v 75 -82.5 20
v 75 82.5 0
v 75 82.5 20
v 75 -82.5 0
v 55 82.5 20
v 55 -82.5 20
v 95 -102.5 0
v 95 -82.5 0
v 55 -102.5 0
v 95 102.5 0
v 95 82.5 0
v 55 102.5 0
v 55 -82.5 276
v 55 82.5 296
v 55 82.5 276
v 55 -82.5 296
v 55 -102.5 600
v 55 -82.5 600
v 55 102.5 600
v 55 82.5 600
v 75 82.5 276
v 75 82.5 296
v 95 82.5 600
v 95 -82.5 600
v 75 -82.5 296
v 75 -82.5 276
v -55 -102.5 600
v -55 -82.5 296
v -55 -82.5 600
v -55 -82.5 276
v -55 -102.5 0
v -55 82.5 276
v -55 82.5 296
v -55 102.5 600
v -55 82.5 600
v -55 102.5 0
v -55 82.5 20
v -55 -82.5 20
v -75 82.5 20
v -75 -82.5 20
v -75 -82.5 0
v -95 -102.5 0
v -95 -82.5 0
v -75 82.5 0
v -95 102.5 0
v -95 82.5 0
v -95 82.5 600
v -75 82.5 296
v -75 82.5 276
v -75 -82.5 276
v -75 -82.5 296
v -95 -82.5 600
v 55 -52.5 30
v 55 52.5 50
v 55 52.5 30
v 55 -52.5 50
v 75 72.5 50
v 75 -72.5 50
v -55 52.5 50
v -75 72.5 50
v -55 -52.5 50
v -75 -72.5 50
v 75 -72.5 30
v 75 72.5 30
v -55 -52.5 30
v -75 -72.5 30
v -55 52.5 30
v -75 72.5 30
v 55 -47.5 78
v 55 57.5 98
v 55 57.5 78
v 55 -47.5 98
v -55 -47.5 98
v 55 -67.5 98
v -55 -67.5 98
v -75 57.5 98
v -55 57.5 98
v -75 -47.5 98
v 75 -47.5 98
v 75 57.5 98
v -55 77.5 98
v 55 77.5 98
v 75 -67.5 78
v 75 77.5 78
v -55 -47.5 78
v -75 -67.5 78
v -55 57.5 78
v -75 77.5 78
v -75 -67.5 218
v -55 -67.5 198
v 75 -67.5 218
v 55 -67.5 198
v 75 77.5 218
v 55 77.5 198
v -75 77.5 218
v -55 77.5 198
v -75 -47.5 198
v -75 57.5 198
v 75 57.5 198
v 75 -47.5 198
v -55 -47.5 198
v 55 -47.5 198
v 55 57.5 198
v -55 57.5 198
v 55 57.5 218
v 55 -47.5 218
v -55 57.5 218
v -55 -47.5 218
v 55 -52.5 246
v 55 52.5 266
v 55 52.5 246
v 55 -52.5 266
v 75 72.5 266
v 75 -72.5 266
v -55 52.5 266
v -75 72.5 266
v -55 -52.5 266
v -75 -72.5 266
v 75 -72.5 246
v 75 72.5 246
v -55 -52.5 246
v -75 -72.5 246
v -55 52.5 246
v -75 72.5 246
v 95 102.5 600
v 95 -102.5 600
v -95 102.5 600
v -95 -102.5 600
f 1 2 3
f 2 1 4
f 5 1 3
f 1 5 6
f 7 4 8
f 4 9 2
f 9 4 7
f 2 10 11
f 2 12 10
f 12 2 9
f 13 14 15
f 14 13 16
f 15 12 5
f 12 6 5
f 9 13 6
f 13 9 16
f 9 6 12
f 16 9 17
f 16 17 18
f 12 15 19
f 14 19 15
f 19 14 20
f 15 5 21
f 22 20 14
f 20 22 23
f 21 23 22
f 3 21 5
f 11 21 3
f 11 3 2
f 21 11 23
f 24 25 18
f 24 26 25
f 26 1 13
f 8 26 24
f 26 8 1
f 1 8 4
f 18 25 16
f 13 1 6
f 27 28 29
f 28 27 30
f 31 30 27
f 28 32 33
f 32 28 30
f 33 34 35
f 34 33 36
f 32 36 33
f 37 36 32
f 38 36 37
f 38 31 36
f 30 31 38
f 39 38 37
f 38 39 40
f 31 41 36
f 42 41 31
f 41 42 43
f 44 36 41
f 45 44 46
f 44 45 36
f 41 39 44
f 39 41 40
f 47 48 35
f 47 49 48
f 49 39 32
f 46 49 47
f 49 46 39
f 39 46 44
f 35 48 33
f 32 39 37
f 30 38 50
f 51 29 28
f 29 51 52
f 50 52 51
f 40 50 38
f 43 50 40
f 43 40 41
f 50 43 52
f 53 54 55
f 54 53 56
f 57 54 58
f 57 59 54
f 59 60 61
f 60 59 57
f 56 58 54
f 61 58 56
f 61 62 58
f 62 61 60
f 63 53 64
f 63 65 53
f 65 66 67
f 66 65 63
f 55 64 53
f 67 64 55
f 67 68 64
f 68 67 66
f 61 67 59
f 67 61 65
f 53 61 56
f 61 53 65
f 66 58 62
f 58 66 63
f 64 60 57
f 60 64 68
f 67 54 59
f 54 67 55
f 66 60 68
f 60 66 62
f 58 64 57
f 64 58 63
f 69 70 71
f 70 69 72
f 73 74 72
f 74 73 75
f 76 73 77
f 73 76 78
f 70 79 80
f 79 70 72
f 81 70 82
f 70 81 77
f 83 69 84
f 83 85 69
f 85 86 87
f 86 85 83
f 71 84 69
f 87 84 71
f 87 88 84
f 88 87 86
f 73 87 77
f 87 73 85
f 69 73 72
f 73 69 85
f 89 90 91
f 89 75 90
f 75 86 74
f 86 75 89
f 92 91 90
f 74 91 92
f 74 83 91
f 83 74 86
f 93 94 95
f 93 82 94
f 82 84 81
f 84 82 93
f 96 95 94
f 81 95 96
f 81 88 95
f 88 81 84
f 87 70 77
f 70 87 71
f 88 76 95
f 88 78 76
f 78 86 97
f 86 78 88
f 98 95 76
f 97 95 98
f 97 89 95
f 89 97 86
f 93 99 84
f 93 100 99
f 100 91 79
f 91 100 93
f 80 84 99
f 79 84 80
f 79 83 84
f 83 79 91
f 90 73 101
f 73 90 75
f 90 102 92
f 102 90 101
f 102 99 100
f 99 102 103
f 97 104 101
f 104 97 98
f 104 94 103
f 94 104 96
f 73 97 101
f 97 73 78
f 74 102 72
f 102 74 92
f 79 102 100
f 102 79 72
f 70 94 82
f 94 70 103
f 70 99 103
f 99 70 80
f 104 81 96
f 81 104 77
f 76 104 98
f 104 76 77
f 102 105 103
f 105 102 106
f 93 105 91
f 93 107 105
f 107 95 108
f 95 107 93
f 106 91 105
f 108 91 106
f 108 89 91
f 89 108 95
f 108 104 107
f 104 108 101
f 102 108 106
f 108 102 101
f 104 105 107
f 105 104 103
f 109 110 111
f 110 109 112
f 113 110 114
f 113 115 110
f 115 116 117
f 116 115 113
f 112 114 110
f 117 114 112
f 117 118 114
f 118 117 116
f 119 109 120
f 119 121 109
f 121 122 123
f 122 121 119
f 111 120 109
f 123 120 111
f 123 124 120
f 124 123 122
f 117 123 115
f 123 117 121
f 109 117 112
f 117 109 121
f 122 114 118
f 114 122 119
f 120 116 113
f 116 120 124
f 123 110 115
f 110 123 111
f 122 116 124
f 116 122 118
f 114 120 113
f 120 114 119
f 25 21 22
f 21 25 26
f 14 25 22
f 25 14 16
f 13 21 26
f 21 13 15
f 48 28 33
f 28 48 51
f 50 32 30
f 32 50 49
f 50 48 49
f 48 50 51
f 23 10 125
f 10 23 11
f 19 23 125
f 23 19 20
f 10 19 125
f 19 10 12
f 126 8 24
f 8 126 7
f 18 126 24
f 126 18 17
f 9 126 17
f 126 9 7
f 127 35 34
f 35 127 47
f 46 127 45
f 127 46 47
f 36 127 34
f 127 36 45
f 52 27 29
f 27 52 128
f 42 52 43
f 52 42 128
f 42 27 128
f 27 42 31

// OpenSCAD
extrusion_length_for_plate_holder_box = 145;
extrusion_width_for_plate_holder_box = 110;
extrusion_height_for_plate_holder_box = 50;
orbit_radius=5;
theta=30;
spinner_gap=28;
dampener_gap=10;
spun_platebox_height=100;
spacing=10;
space_for_apparatus=0;

total_height=600;

module flatbox(length,width,include_cross=true){
    translate([-(width+40)/2,-length/2]){
cube([20,length,20]);
translate([20+width,0])cube([20,length,20]);
        if(include_cross){
translate([20,0])color("red")
cube([width,20,20]);
color("red")
translate([20,length-20])cube([width,20,20]);
        }
}
}

module flatboxconverse(length,width,include_cross=true){
    translate([-length/2,-(width+40)/2]){
cube([length,20,20]);
translate([0,20+width])cube([length,20,20]);
        if(include_cross){
translate([0,20])color("red")
cube([20,width,20]);
color("red")
translate([length-20,20])cube([20,width,20]);
        }
}
}




module flatbox_support(){
     color("purple")
  translate([extrusion_width_for_plate_holder_box/2,-extrusion_length_for_plate_holder_box/2-spacing-space_for_apparatus,0]) cube([20,space_for_apparatus+extrusion_length_for_plate_holder_box+spacing*2,20]);
       

color("purple")
translate([-20-extrusion_width_for_plate_holder_box/2,-extrusion_length_for_plate_holder_box/2-spacing-space_for_apparatus,0]) cube([20,space_for_apparatus+extrusion_length_for_plate_holder_box+spacing*2,20]);
    }
    
module flatbox_for_plates(){
    flatbox(extrusion_length_for_plate_holder_box,extrusion_width_for_plate_holder_box);
    }

module platebox(height){
flatbox_for_plates();

    translate([-(extrusion_width_for_plate_holder_box+40)/2,-extrusion_length_for_plate_holder_box/2]){
    color("blue") translate([0,0,20])cube([20,20,height]);
    color("blue") translate([20+extrusion_width_for_plate_holder_box,0,20])cube([20,20,height]);
    color("blue") translate([20+extrusion_width_for_plate_holder_box,extrusion_length_for_plate_holder_box-20,20])cube([20,20,height]);
    color("blue") translate([0,extrusion_length_for_plate_holder_box-20,20])cube([20,20,height]);
    }
    translate([0,0,20+height])flatbox_for_plates();
}


flatbox_support();
translate([0,0,20+dampener_gap])
flatbox_for_plates();
translate([orbit_radius*sin($t*360),orbit_radius*cos($t*360),20+dampener_gap+20+spinner_gap])
platebox(spun_platebox_height);
translate([0,0,20+dampener_gap+20+spinner_gap*2+spun_platebox_height+40]) flatbox_for_plates(); 

translate([0,0,20+dampener_gap+20+spinner_gap*2+spun_platebox_height+40+20+dampener_gap]) flatbox_support(); 


module 4posts(){
    color("green")
translate([extrusion_width_for_plate_holder_box/2,extrusion_length_for_plate_holder_box/2+spacing,0]) cube([40,20,total_height]);
color("green")
translate([extrusion_width_for_plate_holder_box/2,-extrusion_length_for_plate_holder_box/2-spacing-space_for_apparatus-20,0]) cube([40,20,total_height]);
        color("green")
translate([-extrusion_width_for_plate_holder_box/2-40,extrusion_length_for_plate_holder_box/2+spacing,0]) cube([40,20,total_height]);
color("green")
translate([-extrusion_width_for_plate_holder_box/2-40,-extrusion_length_for_plate_holder_box/2-spacing-20-space_for_apparatus,0]) cube([40,20,total_height]);
};

4posts();
